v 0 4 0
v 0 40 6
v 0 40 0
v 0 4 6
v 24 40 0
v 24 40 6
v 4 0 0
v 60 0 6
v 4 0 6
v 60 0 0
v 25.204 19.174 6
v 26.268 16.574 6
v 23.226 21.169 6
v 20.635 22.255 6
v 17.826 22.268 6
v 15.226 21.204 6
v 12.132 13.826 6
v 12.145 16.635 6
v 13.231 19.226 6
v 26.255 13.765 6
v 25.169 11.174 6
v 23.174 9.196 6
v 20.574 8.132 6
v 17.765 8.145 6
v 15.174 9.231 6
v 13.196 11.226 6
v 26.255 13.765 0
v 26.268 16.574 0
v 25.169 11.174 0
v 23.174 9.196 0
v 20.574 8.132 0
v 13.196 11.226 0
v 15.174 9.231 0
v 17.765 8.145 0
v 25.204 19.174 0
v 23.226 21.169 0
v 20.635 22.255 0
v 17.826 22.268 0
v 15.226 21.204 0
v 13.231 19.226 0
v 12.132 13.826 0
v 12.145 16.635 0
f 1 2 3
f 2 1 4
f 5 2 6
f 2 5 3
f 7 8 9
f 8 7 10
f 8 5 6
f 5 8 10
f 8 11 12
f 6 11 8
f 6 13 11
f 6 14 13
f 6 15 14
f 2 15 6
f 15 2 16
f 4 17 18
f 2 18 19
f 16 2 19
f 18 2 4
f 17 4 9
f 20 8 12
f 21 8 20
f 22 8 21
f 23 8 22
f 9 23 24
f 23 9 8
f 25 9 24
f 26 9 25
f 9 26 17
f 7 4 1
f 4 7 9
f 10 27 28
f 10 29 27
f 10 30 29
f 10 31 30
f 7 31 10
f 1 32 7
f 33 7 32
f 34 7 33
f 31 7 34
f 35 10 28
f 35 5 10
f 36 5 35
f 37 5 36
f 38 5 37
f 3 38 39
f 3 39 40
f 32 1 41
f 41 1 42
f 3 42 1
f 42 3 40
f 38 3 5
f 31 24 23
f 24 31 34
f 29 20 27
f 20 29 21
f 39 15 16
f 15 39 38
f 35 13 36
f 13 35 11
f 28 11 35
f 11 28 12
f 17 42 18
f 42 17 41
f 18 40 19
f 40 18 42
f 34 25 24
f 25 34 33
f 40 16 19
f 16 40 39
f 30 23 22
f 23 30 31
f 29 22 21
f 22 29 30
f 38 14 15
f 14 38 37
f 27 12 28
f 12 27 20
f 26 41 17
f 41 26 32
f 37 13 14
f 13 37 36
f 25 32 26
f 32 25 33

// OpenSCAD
$fn = 32;

// ----------------------------------------------------------------------
// Bracket plate: gusset 60 x 40
// ----------------------------------------------------------------------

// --- parameters (mm) ---
hole_r = 3.5;             // bolt hole radius
plate_t = 6;              // plate thickness, Z (extrusion height)
gus_a = 60;               // base length
gus_b = 40;               // height
top_x = 24;               // top edge X of the angled cut
light_r = 7.2;            // lightening hole radius
fit_tol = 0.05;           // declared fit tolerance (prompt contract)
free_tol = 0.2;           // declared free tolerance (prompt contract)

light_d = 2 * light_r;

profile = [[4, 0], [30, 0], [60, 0], [24, 40], [0, 40], [0, 4]];  // primary outline, 6 points, counter clockwise
void_1 = [[26.268, 16.574], [25.204, 19.174], [23.226, 21.169], [20.635, 22.255], [17.826, 22.268], [15.226, 21.204], [13.231, 19.226], [12.145, 16.635], [12.132, 13.826], [13.196, 11.226], [15.174, 9.231], [17.765, 8.145], [20.574, 8.132], [23.174, 9.196], [25.169, 11.174], [26.255, 13.765]];  // lightening hole, 16 points

// --- the one profile operation ---
difference() {
  linear_extrude(height = plate_t) polygon(points = profile);
  translate([0, 0, -1])
    linear_extrude(height = plate_t + 2) polygon(points = void_1);
}
